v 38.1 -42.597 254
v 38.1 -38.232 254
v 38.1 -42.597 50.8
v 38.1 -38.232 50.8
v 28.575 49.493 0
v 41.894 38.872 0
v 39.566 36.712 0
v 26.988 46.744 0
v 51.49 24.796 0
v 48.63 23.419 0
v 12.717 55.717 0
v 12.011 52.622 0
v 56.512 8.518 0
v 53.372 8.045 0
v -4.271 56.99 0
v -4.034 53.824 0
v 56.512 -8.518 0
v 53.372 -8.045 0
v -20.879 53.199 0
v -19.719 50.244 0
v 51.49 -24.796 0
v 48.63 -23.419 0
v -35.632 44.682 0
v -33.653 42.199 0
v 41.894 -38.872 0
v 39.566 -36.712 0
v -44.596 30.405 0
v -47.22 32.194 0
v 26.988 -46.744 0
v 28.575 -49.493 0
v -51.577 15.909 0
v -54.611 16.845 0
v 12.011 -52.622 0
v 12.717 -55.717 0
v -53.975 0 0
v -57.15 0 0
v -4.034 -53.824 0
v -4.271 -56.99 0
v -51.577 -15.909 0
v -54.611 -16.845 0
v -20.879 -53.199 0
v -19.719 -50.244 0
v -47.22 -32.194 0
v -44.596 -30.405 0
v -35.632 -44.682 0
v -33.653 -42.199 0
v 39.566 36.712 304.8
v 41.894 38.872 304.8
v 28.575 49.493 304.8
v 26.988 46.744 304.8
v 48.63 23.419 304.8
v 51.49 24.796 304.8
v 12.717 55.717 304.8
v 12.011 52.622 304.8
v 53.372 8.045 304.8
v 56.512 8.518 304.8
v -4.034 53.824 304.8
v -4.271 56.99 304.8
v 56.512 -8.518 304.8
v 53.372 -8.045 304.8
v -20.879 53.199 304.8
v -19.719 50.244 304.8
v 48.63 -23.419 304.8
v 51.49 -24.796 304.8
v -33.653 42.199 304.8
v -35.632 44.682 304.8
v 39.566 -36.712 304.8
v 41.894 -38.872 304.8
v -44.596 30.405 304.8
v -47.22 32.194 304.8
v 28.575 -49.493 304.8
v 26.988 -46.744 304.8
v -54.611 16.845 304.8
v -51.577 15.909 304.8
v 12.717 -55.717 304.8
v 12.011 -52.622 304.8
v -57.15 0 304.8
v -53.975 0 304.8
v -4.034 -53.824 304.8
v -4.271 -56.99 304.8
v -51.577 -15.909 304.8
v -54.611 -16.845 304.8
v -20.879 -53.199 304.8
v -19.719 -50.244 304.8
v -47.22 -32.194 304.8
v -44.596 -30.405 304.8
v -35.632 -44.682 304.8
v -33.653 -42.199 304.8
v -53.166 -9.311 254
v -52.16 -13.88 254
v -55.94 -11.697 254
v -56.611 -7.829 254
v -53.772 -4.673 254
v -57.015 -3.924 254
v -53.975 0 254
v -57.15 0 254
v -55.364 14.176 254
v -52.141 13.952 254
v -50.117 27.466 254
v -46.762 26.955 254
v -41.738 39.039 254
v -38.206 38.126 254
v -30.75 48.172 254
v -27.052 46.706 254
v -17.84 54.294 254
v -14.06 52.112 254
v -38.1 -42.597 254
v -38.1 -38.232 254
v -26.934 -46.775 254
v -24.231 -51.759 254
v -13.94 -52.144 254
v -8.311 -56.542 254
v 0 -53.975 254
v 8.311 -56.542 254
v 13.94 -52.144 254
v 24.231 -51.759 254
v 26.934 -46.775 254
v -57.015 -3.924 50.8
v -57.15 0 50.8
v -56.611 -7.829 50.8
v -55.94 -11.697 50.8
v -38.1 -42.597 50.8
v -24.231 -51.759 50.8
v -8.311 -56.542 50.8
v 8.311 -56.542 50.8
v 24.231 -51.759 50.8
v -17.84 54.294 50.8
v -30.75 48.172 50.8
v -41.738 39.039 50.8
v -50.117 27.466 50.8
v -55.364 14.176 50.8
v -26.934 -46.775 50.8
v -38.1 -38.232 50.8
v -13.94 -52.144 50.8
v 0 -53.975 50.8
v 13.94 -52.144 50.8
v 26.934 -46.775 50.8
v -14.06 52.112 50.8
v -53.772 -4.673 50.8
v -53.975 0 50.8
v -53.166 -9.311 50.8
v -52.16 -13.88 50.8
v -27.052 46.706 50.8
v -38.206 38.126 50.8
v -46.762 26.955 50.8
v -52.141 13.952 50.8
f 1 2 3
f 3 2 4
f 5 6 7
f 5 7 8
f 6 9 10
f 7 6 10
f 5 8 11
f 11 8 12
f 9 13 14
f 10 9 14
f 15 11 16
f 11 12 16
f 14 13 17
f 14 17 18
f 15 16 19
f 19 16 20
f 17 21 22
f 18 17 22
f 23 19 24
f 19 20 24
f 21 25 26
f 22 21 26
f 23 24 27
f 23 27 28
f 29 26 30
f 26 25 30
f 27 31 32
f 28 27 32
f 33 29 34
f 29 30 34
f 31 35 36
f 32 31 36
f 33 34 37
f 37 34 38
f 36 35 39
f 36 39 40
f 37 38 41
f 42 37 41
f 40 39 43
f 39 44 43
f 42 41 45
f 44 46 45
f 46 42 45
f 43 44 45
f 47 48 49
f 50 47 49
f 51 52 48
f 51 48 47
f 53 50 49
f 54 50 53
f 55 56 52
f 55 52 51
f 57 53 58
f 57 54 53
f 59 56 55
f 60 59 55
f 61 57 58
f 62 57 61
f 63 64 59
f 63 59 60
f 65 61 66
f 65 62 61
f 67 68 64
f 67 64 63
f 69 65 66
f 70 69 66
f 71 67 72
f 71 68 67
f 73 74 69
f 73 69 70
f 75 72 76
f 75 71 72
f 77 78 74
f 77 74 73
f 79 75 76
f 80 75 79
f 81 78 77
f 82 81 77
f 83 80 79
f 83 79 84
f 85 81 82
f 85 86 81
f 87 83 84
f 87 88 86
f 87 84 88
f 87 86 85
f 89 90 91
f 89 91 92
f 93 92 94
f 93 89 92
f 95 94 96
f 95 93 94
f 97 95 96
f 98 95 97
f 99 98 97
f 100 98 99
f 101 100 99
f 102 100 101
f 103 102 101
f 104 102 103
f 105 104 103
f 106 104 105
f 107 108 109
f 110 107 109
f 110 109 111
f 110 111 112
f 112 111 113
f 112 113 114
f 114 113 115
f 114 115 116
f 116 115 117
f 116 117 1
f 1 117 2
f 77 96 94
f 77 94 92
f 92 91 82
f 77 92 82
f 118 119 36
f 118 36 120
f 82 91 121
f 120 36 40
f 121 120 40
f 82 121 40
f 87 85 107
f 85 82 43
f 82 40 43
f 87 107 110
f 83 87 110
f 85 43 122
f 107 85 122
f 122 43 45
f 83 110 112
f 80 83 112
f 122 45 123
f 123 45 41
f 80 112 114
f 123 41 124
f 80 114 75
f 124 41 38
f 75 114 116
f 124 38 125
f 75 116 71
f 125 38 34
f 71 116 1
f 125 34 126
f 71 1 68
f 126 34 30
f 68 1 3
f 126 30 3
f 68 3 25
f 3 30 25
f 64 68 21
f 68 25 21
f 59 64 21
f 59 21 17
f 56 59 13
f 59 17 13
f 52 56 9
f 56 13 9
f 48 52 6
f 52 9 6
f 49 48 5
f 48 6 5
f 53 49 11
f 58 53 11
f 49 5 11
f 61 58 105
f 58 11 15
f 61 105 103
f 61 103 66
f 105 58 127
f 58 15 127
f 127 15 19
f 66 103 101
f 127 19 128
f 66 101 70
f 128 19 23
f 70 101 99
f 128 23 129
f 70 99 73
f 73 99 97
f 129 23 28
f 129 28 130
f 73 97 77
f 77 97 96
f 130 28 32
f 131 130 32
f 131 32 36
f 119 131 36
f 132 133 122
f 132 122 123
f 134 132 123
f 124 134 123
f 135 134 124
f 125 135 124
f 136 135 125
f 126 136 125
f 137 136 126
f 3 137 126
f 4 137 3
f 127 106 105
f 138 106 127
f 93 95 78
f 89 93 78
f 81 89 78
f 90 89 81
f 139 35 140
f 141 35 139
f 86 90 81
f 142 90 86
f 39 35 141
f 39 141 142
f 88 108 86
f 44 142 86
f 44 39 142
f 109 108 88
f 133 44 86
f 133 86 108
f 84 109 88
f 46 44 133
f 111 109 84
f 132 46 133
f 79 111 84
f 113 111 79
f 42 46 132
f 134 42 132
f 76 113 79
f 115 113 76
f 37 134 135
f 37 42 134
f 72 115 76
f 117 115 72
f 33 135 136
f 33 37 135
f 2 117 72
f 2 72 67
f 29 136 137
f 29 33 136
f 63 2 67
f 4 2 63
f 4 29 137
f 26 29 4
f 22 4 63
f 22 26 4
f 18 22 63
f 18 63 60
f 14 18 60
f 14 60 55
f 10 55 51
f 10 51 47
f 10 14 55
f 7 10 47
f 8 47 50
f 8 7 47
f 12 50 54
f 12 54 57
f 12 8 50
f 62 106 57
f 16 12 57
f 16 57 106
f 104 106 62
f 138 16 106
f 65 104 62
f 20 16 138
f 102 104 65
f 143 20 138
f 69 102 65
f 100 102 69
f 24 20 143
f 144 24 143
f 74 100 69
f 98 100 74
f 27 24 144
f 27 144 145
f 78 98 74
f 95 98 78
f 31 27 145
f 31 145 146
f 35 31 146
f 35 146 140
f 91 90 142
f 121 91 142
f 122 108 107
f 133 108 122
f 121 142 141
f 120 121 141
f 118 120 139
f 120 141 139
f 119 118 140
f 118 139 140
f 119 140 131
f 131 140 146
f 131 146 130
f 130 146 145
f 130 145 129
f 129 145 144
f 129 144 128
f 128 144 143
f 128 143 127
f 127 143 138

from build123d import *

# Parameters (mm, degrees)
SKETCH1_R      = 57.15
SKETCH1_R_2    = 53.975
EXTRUDE1_DEPTH = 304.8
SKETCH2_W      = 76.2
SKETCH2_H      = 203.2
EXTRUDE2_DEPTH = 316.333609056
SKETCH3_W      = 203.2
SKETCH3_H      = 76.2
EXTRUDE3_DEPTH = 316.333609056


with BuildPart() as part:
    # Sketch1 → Extrude1 (new body)
    with BuildSketch(Plane.XY):
        with Locations(Location((0, 0, 0), (0, 0, 180))):
            Circle(SKETCH1_R)
        with Locations(Location((0, 0, 0), (0, 0, 180))):
            Circle(SKETCH1_R_2, mode=Mode.SUBTRACT)
    extrude(amount=EXTRUDE1_DEPTH)

    # Sketch2 → Extrude2 (cut, through all)
    with BuildSketch(Plane(origin=(0, 0, 0), x_dir=(1, 0, 0), z_dir=(0, 1, 0))):
        with Locations((0, -152.4)):
            Rectangle(SKETCH2_W, SKETCH2_H)
    extrude(amount=-EXTRUDE2_DEPTH, mode=Mode.SUBTRACT)

    # Sketch3 → Extrude3 (cut, through all)
    with BuildSketch(Plane(origin=(0, 0, 0), x_dir=(0, 0, -1), z_dir=(0.8660254037844365, -0.500000000000004, 0))):
        with Locations((-152.4, 0)):
            Rectangle(SKETCH3_W, SKETCH3_H)
    extrude(amount=-EXTRUDE3_DEPTH, mode=Mode.SUBTRACT)


solid = part.part
